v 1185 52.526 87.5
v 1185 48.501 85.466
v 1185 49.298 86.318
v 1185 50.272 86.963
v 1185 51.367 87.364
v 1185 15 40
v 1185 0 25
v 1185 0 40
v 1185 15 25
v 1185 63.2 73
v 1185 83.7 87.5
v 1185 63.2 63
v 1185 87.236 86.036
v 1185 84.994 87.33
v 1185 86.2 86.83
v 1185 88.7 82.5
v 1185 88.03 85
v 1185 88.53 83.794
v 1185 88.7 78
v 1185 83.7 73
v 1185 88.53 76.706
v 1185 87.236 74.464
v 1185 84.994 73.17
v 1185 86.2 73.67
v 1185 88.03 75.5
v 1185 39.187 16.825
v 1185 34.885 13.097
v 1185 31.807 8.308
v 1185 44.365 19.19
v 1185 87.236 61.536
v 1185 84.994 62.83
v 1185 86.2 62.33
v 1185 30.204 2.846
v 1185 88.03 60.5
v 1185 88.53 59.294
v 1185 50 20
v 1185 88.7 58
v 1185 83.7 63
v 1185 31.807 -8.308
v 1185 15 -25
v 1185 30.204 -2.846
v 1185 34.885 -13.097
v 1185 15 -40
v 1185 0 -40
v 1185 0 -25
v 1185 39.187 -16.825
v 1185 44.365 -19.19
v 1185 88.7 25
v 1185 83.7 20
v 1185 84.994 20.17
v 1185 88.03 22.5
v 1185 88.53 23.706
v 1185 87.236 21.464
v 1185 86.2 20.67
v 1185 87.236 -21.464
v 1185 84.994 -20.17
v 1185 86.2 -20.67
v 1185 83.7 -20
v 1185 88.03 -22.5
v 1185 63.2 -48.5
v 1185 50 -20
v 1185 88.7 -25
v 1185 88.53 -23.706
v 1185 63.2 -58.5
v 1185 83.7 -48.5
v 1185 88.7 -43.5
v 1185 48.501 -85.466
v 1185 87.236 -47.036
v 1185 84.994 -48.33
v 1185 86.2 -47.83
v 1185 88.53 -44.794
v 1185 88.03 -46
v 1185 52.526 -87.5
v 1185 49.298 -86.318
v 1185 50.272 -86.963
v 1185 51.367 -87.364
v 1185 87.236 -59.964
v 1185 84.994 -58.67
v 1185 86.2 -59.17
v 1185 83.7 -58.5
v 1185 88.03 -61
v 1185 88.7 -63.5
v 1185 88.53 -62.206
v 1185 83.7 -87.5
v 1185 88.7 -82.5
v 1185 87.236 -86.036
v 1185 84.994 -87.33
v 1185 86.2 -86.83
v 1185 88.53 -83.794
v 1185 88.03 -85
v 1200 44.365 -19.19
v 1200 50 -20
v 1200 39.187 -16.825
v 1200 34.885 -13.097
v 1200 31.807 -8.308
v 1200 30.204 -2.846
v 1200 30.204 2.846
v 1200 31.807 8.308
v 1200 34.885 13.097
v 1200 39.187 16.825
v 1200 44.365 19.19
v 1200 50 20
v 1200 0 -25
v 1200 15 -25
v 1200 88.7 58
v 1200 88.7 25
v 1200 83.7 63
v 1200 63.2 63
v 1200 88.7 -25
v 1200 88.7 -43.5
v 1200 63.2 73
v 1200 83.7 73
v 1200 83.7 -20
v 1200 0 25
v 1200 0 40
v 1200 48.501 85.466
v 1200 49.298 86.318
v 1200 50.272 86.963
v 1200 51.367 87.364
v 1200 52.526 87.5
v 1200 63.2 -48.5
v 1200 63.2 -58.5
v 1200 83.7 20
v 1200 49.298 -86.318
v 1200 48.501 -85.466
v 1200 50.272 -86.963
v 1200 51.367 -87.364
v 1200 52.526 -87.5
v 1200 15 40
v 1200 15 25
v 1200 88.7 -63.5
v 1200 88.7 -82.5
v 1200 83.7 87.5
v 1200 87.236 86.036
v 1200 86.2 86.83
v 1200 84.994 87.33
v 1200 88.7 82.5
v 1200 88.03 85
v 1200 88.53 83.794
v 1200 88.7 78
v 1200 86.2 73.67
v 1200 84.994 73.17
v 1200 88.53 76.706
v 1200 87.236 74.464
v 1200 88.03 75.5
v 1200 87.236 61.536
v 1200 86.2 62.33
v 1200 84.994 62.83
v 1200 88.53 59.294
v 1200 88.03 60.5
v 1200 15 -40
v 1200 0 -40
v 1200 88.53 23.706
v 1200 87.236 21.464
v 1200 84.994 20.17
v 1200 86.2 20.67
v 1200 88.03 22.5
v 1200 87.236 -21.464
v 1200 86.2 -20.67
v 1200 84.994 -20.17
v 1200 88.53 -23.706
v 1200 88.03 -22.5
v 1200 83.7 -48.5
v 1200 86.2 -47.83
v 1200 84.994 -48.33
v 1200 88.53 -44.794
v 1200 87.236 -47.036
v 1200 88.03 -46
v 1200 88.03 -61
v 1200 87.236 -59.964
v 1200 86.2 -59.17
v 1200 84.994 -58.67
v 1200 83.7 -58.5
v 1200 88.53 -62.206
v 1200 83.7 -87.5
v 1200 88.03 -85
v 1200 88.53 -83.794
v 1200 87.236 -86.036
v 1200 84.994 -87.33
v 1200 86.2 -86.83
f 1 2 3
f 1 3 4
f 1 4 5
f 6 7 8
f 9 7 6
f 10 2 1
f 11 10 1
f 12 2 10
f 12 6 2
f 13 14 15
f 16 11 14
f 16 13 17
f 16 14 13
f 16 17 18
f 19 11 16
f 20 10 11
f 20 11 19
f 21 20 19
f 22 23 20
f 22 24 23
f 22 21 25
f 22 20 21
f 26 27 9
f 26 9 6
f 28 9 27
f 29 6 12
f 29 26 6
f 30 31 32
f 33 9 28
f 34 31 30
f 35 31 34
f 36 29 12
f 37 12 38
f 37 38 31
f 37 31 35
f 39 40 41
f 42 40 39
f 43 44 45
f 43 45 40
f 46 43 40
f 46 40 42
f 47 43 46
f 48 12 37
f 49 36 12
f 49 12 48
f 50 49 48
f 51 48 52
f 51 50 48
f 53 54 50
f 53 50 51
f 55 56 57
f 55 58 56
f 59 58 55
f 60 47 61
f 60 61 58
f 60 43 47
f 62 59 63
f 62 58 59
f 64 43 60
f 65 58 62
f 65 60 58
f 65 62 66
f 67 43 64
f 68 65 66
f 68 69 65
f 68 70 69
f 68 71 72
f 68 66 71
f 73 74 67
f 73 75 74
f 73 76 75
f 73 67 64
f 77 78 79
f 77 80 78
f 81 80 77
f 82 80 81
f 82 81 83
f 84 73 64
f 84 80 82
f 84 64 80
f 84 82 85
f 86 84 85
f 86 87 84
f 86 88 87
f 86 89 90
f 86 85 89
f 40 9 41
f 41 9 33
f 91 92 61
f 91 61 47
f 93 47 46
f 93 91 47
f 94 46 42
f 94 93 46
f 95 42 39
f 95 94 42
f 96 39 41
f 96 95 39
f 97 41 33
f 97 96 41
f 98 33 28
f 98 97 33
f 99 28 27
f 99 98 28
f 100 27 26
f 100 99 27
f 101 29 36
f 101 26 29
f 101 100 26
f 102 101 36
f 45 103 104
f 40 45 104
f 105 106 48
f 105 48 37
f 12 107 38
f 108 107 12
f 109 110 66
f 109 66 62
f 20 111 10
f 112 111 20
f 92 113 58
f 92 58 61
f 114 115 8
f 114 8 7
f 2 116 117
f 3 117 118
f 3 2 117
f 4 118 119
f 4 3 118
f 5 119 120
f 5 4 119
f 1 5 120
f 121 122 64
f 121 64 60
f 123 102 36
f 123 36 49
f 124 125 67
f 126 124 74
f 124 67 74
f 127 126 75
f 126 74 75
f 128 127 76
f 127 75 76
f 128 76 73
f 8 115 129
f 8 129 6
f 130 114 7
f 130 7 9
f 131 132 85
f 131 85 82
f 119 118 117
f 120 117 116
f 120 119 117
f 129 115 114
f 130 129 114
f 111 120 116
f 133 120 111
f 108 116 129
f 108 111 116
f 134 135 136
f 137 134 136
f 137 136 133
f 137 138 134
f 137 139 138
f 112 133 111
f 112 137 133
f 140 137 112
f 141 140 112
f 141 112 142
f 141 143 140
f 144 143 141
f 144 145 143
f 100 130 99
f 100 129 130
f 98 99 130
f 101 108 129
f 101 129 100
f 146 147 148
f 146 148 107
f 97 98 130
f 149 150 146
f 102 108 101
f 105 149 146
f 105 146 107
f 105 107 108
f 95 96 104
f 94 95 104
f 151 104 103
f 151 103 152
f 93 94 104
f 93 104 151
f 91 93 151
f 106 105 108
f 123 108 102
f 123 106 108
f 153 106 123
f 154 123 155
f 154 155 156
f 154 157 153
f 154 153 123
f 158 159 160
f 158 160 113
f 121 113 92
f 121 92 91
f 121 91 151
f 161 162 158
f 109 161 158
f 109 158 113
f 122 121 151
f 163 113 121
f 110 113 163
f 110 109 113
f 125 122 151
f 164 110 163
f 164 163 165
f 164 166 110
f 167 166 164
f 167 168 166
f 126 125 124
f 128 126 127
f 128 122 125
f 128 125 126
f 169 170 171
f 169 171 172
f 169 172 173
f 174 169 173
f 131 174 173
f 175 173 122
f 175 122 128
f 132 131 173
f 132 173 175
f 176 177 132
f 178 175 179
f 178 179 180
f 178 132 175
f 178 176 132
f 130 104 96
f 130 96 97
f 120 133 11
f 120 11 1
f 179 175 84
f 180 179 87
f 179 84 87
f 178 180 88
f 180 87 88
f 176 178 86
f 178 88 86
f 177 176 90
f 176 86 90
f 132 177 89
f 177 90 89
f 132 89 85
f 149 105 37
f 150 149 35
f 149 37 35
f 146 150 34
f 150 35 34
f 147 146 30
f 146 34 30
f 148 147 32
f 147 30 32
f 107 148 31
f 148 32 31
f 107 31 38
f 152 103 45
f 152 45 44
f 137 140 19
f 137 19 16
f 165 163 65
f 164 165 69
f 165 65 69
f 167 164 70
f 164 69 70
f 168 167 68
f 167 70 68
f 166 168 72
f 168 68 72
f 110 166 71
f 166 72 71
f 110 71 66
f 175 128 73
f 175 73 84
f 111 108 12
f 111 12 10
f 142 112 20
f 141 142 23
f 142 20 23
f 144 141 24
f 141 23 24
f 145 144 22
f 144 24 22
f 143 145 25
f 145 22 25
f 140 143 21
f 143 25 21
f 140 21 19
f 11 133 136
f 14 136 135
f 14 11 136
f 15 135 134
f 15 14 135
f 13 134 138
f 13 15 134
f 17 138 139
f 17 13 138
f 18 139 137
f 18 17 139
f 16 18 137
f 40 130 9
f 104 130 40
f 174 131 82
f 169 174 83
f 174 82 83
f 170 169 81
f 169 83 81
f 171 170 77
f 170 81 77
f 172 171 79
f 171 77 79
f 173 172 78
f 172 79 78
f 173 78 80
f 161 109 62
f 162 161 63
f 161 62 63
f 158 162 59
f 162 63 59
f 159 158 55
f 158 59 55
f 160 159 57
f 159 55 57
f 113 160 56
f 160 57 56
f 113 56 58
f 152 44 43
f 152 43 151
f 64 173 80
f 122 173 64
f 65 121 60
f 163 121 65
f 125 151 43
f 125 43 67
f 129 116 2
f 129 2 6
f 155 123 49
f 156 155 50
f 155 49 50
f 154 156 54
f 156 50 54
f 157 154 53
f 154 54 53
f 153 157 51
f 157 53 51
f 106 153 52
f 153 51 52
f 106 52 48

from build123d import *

# Parameters (mm, degrees)
BOSS_EXTRUDE1_DEPTH             = 15
BOSS_EXTRUDE2_REACH             = 1239.023
BOSS_EXTRUDE2_DIRECTION_2_REACH = 1239.023
CUT_EXTRUDE2_DEPTH              = 1238.578280352
CUT_EXTRUDE2_DEPTH_BACK         = 1238.578280352
SKETCH5_W                       = 40
SKETCH5_H                       = 40
CUT_EXTRUDE3_DEPTH              = 1238.578280352
BOSS_EXTRUDE4_DEPTH             = 75
CUT_EXTRUDE4_DEPTH              = 1241.107934819
CUT_EXTRUDE4_DEPTH_BACK         = 1241.107934819
SKETCH8_W                       = 15
SKETCH8_H                       = 73.7
FILLET1_R                       = 5
CUT_EXTRUDE5_DEPTH              = 1241.107934819
CUT_EXTRUDE5_DEPTH_BACK         = 1241.107934819
SKETCH9_W                       = 1635
SKETCH9_H                       = 600
SKETCH10_W                      = 50
SKETCH10_H                      = 15
CUT_EXTRUDE6_DEPTH              = 126.494780768


with BuildPart() as part:
    # Sketch1 → Boss-Extrude1 (new body)
    with BuildSketch(Plane(origin=(0, 0, 0), x_dir=(1, 0, 0), z_dir=(0, 1, 0))):
        Polygon((-450, 300), (-400, 300), (-200, 250), (600, 40), (1200, 40), (1200, -40), (600, -40), (-200, -250), (-400, -300), (-450, -300), align=None)
    extrude(amount=BOSS_EXTRUDE1_DEPTH)

    # Boss-Extrude2: up to this face of the body (flat: up to its plane)
    boss_extrude2_end = Plane(part.part.faces().sort_by_distance((-425, 7.5, 300))[0])
    # Sketch2 → Boss-Extrude2 (add, up to the picked face)
    with BuildSketch(Plane.XY, mode=Mode.PRIVATE) as boss_extrude2_sk1:
        with BuildLine():
            Line((-425, 0), (-450, 0))
            Line((-450, 0), (-450, -40))
            Line((-450, -40), (-440, -40))
            Line((-440, -40), (-440, -15))
            ThreePointArc((-440, -15), (-435.606601718, -4.393398282), (-425, 0))
        make_face()
    boss_extrude2_tool1 = split(extrude(boss_extrude2_sk1.sketch, amount=BOSS_EXTRUDE2_REACH, mode=Mode.PRIVATE), bisect_by=boss_extrude2_end, keep=Keep.BOTH, mode=Mode.PRIVATE)
    # Sketch2 → Boss-Extrude2 (add, up to the picked face)
    with BuildSketch(Plane.XY, mode=Mode.PRIVATE) as boss_extrude2_sk2:
        with BuildLine():
            Line((-400, 0), (-425, 0))
            ThreePointArc((-425, 0), (-414.393398282, -4.393398282), (-410, -15))
            Line((-410, -15), (-410, -40))
            Line((-410, -40), (-400, -40))
            Line((-400, -40), (-400, 0))
        make_face()
    boss_extrude2_tool2 = split(extrude(boss_extrude2_sk2.sketch, amount=BOSS_EXTRUDE2_REACH, mode=Mode.PRIVATE), bisect_by=boss_extrude2_end, keep=Keep.BOTH, mode=Mode.PRIVATE)
    add(boss_extrude2_tool1.solids().sort_by(Axis((-444.100555, -18.206662, 0), (0, 0, 1)))[0])
    add(boss_extrude2_tool2.solids().sort_by(Axis((-405.899445, -18.206662, 0), (0, 0, 1)))[0])

    # Boss-Extrude2 direction 2: up to this face of the body (flat: up to its plane)
    boss_extrude2_direction_2_end = Plane(part.part.faces().sort_by_distance((-425, 7.5, -300))[0])
    # Sketch2 → Boss-Extrude2 direction 2 (add, up to the picked face)
    with BuildSketch(Plane.XY, mode=Mode.PRIVATE) as boss_extrude2_direction_2_sk1:
        with BuildLine():
            Line((-425, 0), (-450, 0))
            Line((-450, 0), (-450, -40))
            Line((-450, -40), (-440, -40))
            Line((-440, -40), (-440, -15))
            ThreePointArc((-440, -15), (-435.606601718, -4.393398282), (-425, 0))
        make_face()
    boss_extrude2_direction_2_tool1 = split(extrude(boss_extrude2_direction_2_sk1.sketch, amount=-BOSS_EXTRUDE2_DIRECTION_2_REACH, mode=Mode.PRIVATE), bisect_by=boss_extrude2_direction_2_end, keep=Keep.BOTH, mode=Mode.PRIVATE)
    # Sketch2 → Boss-Extrude2 direction 2 (add, up to the picked face)
    with BuildSketch(Plane.XY, mode=Mode.PRIVATE) as boss_extrude2_direction_2_sk2:
        with BuildLine():
            Line((-400, 0), (-425, 0))
            ThreePointArc((-425, 0), (-414.393398282, -4.393398282), (-410, -15))
            Line((-410, -15), (-410, -40))
            Line((-410, -40), (-400, -40))
            Line((-400, -40), (-400, 0))
        make_face()
    boss_extrude2_direction_2_tool2 = split(extrude(boss_extrude2_direction_2_sk2.sketch, amount=-BOSS_EXTRUDE2_DIRECTION_2_REACH, mode=Mode.PRIVATE), bisect_by=boss_extrude2_direction_2_end, keep=Keep.BOTH, mode=Mode.PRIVATE)
    add(boss_extrude2_direction_2_tool1.solids().sort_by(Axis((-444.100555, -18.206662, 0), (0, 0, -1)))[0])
    add(boss_extrude2_direction_2_tool2.solids().sort_by(Axis((-405.899445, -18.206662, 0), (0, 0, -1)))[0])

    # Sketch4 → Cut-Extrude2 (cut, two sides: drawn at the far end of the back side and taken through both)
    with BuildSketch(Plane(origin=(0, 0, 0), x_dir=(1, 0, 0), z_dir=(0, 1, 0)).offset(-CUT_EXTRUDE2_DEPTH_BACK)):
        Polygon((-450, 230), (-400, 230), (-150, 167.5), (-150, -167.5), (-400, -230), (-450, -230), align=None)
        Polygon((-100, 155), (-100, -155), (520, 0), align=None)
    extrude(amount=CUT_EXTRUDE2_DEPTH + CUT_EXTRUDE2_DEPTH_BACK, mode=Mode.SUBTRACT)

    # Sketch5 → Cut-Extrude3 (cut, through all)
    with BuildSketch(Plane(origin=(0, 0, 0), x_dir=(0, 0, -1), z_dir=(1, 0, 0))):
        with Locations((-265, -20)):
            Rectangle(SKETCH5_W, SKETCH5_H)
        with Locations((265, -20)):
            Rectangle(SKETCH5_W, SKETCH5_H)
    extrude(amount=-CUT_EXTRUDE3_DEPTH, mode=Mode.SUBTRACT)

    # Sketch7 → Boss-Extrude4 (add)
    with BuildSketch(Plane(origin=(1200, 0, 0), x_dir=(0, 0, -1), z_dir=(1, 0, 0))):
        with BuildLine():
            Line((-87.5, 50), (-40, 15))
            Line((-40, 15), (40, 15))
            Line((40, 15), (87.5, 50))
            Line((87.5, 50), (87.5, 88.7))
            Line((87.5, 88.7), (58.5, 88.7))
            Line((58.5, 88.7), (58.5, 63.2))
            Line((58.5, 63.2), (48.5, 63.2))
            Line((48.5, 63.2), (48.5, 88.7))
            Line((48.5, 88.7), (20, 88.7))
            Line((20, 88.7), (20, 50))
            ThreePointArc((20, 50), (0, 30), (-20, 50))
            Line((-20, 50), (-20, 88.7))
            Line((-20, 88.7), (-63, 88.7))
            Line((-63, 88.7), (-63, 63.2))
            Line((-63, 63.2), (-73, 63.2))
            Line((-73, 63.2), (-73, 88.7))
            Line((-73, 88.7), (-87.5, 88.7))
            Line((-87.5, 88.7), (-87.5, 50))
        make_face()
    extrude(amount=-BOSS_EXTRUDE4_DEPTH)

    # Sketch8 → Cut-Extrude4 (cut, two sides: drawn at the far end of the back side and taken through both)
    with BuildSketch(Plane.XY.offset(-CUT_EXTRUDE4_DEPTH_BACK)):
        with Locations((1147.5, 51.85)):
            Rectangle(SKETCH8_W, SKETCH8_H)
        with Locations((1177.5, 51.85)):
            Rectangle(SKETCH8_W, SKETCH8_H)
    extrude(amount=CUT_EXTRUDE4_DEPTH + CUT_EXTRUDE4_DEPTH_BACK, mode=Mode.SUBTRACT)

    # Fillet1
    fillet1_edges = [part.edges().sort_by_distance(p)[0] for p in [
        (1192.5, 50, 87.5),
        (1162.5, 50, 87.5),
        (1132.5, 50, 87.5),
        (1192.5, 50, -87.5),
        (1162.5, 50, -87.5),
        (1132.5, 50, -87.5),
        (1192.5, 88.7, -87.5),
        (1162.5, 88.7, -87.5),
        (1132.5, 88.7, -87.5),
        (1132.5, 88.7, -58.5),
        (1162.5, 88.7, -58.5),
        (1192.5, 88.7, -58.5),
        (1192.5, 88.7, -48.5),
        (1162.5, 88.7, -48.5),
        (1132.5, 88.7, -48.5),
        (1192.5, 88.7, -20),
        (1162.5, 88.7, -20),
        (1132.5, 88.7, -20),
        (1192.5, 88.7, 63),
        (1162.5, 88.7, 63),
        (1132.5, 88.7, 63),
        (1132.5, 88.7, 87.5),
        (1162.5, 88.7, 87.5),
        (1192.5, 88.7, 87.5),
        (1192.5, 88.7, 73),
        (1162.5, 88.7, 73),
        (1132.5, 88.7, 73),
        (1192.5, 88.7, 20),
        (1162.5, 88.7, 20),
        (1132.5, 88.7, 20),
        (600, 7.5, 40),
        (600, 7.5, -40),
        (520, 7.5, 0),
        (-440, -40, -292.5),
        (-440, -40, -237.5),
        (-400, -40, -292.5),
        (-400, -40, -237.5),
        (-450, -40, -237.5),
        (-410, -40, -237.5),
        (-450, -40, -292.5),
        (-410, -40, -292.5),
        (-150, 7.5, 167.5),
        (-100, 7.5, 155),
        (-150, 7.5, -167.5),
        (-100, 7.5, -155),
        (-450, -40, 237.5),
        (-410, -40, 237.5),
        (-440, -40, 237.5),
        (-400, -40, 237.5),
        (-450, -40, 292.5),
        (-440, -40, 292.5),
        (-400, -40, 292.5),
        (-410, -40, 292.5),
    ]]
    fillet(fillet1_edges, radius=FILLET1_R - 0.0001)  # a hair under: the kernel refuses the full size

    # Sketch9 → Cut-Extrude5 (cut, two sides: drawn at the far end of the back side and taken through both)
    with BuildSketch(Plane(origin=(0, 0, 0), x_dir=(1, 0, 0), z_dir=(0, 1, 0)).offset(-CUT_EXTRUDE5_DEPTH_BACK)):
        with Locations((367.5, 0)):
            Rectangle(SKETCH9_W, SKETCH9_H)
    extrude(amount=CUT_EXTRUDE5_DEPTH + CUT_EXTRUDE5_DEPTH_BACK, mode=Mode.SUBTRACT)

    # Sketch10 → Cut-Extrude6 (cut, through all)
    with BuildSketch(Plane(origin=(1200, 0, 0), x_dir=(0, 0, -1), z_dir=(1, 0, 0))):
        with Locations((0, 7.5)):
            Rectangle(SKETCH10_W, SKETCH10_H)
    extrude(amount=-CUT_EXTRUDE6_DEPTH, mode=Mode.SUBTRACT)


solid = part.part
